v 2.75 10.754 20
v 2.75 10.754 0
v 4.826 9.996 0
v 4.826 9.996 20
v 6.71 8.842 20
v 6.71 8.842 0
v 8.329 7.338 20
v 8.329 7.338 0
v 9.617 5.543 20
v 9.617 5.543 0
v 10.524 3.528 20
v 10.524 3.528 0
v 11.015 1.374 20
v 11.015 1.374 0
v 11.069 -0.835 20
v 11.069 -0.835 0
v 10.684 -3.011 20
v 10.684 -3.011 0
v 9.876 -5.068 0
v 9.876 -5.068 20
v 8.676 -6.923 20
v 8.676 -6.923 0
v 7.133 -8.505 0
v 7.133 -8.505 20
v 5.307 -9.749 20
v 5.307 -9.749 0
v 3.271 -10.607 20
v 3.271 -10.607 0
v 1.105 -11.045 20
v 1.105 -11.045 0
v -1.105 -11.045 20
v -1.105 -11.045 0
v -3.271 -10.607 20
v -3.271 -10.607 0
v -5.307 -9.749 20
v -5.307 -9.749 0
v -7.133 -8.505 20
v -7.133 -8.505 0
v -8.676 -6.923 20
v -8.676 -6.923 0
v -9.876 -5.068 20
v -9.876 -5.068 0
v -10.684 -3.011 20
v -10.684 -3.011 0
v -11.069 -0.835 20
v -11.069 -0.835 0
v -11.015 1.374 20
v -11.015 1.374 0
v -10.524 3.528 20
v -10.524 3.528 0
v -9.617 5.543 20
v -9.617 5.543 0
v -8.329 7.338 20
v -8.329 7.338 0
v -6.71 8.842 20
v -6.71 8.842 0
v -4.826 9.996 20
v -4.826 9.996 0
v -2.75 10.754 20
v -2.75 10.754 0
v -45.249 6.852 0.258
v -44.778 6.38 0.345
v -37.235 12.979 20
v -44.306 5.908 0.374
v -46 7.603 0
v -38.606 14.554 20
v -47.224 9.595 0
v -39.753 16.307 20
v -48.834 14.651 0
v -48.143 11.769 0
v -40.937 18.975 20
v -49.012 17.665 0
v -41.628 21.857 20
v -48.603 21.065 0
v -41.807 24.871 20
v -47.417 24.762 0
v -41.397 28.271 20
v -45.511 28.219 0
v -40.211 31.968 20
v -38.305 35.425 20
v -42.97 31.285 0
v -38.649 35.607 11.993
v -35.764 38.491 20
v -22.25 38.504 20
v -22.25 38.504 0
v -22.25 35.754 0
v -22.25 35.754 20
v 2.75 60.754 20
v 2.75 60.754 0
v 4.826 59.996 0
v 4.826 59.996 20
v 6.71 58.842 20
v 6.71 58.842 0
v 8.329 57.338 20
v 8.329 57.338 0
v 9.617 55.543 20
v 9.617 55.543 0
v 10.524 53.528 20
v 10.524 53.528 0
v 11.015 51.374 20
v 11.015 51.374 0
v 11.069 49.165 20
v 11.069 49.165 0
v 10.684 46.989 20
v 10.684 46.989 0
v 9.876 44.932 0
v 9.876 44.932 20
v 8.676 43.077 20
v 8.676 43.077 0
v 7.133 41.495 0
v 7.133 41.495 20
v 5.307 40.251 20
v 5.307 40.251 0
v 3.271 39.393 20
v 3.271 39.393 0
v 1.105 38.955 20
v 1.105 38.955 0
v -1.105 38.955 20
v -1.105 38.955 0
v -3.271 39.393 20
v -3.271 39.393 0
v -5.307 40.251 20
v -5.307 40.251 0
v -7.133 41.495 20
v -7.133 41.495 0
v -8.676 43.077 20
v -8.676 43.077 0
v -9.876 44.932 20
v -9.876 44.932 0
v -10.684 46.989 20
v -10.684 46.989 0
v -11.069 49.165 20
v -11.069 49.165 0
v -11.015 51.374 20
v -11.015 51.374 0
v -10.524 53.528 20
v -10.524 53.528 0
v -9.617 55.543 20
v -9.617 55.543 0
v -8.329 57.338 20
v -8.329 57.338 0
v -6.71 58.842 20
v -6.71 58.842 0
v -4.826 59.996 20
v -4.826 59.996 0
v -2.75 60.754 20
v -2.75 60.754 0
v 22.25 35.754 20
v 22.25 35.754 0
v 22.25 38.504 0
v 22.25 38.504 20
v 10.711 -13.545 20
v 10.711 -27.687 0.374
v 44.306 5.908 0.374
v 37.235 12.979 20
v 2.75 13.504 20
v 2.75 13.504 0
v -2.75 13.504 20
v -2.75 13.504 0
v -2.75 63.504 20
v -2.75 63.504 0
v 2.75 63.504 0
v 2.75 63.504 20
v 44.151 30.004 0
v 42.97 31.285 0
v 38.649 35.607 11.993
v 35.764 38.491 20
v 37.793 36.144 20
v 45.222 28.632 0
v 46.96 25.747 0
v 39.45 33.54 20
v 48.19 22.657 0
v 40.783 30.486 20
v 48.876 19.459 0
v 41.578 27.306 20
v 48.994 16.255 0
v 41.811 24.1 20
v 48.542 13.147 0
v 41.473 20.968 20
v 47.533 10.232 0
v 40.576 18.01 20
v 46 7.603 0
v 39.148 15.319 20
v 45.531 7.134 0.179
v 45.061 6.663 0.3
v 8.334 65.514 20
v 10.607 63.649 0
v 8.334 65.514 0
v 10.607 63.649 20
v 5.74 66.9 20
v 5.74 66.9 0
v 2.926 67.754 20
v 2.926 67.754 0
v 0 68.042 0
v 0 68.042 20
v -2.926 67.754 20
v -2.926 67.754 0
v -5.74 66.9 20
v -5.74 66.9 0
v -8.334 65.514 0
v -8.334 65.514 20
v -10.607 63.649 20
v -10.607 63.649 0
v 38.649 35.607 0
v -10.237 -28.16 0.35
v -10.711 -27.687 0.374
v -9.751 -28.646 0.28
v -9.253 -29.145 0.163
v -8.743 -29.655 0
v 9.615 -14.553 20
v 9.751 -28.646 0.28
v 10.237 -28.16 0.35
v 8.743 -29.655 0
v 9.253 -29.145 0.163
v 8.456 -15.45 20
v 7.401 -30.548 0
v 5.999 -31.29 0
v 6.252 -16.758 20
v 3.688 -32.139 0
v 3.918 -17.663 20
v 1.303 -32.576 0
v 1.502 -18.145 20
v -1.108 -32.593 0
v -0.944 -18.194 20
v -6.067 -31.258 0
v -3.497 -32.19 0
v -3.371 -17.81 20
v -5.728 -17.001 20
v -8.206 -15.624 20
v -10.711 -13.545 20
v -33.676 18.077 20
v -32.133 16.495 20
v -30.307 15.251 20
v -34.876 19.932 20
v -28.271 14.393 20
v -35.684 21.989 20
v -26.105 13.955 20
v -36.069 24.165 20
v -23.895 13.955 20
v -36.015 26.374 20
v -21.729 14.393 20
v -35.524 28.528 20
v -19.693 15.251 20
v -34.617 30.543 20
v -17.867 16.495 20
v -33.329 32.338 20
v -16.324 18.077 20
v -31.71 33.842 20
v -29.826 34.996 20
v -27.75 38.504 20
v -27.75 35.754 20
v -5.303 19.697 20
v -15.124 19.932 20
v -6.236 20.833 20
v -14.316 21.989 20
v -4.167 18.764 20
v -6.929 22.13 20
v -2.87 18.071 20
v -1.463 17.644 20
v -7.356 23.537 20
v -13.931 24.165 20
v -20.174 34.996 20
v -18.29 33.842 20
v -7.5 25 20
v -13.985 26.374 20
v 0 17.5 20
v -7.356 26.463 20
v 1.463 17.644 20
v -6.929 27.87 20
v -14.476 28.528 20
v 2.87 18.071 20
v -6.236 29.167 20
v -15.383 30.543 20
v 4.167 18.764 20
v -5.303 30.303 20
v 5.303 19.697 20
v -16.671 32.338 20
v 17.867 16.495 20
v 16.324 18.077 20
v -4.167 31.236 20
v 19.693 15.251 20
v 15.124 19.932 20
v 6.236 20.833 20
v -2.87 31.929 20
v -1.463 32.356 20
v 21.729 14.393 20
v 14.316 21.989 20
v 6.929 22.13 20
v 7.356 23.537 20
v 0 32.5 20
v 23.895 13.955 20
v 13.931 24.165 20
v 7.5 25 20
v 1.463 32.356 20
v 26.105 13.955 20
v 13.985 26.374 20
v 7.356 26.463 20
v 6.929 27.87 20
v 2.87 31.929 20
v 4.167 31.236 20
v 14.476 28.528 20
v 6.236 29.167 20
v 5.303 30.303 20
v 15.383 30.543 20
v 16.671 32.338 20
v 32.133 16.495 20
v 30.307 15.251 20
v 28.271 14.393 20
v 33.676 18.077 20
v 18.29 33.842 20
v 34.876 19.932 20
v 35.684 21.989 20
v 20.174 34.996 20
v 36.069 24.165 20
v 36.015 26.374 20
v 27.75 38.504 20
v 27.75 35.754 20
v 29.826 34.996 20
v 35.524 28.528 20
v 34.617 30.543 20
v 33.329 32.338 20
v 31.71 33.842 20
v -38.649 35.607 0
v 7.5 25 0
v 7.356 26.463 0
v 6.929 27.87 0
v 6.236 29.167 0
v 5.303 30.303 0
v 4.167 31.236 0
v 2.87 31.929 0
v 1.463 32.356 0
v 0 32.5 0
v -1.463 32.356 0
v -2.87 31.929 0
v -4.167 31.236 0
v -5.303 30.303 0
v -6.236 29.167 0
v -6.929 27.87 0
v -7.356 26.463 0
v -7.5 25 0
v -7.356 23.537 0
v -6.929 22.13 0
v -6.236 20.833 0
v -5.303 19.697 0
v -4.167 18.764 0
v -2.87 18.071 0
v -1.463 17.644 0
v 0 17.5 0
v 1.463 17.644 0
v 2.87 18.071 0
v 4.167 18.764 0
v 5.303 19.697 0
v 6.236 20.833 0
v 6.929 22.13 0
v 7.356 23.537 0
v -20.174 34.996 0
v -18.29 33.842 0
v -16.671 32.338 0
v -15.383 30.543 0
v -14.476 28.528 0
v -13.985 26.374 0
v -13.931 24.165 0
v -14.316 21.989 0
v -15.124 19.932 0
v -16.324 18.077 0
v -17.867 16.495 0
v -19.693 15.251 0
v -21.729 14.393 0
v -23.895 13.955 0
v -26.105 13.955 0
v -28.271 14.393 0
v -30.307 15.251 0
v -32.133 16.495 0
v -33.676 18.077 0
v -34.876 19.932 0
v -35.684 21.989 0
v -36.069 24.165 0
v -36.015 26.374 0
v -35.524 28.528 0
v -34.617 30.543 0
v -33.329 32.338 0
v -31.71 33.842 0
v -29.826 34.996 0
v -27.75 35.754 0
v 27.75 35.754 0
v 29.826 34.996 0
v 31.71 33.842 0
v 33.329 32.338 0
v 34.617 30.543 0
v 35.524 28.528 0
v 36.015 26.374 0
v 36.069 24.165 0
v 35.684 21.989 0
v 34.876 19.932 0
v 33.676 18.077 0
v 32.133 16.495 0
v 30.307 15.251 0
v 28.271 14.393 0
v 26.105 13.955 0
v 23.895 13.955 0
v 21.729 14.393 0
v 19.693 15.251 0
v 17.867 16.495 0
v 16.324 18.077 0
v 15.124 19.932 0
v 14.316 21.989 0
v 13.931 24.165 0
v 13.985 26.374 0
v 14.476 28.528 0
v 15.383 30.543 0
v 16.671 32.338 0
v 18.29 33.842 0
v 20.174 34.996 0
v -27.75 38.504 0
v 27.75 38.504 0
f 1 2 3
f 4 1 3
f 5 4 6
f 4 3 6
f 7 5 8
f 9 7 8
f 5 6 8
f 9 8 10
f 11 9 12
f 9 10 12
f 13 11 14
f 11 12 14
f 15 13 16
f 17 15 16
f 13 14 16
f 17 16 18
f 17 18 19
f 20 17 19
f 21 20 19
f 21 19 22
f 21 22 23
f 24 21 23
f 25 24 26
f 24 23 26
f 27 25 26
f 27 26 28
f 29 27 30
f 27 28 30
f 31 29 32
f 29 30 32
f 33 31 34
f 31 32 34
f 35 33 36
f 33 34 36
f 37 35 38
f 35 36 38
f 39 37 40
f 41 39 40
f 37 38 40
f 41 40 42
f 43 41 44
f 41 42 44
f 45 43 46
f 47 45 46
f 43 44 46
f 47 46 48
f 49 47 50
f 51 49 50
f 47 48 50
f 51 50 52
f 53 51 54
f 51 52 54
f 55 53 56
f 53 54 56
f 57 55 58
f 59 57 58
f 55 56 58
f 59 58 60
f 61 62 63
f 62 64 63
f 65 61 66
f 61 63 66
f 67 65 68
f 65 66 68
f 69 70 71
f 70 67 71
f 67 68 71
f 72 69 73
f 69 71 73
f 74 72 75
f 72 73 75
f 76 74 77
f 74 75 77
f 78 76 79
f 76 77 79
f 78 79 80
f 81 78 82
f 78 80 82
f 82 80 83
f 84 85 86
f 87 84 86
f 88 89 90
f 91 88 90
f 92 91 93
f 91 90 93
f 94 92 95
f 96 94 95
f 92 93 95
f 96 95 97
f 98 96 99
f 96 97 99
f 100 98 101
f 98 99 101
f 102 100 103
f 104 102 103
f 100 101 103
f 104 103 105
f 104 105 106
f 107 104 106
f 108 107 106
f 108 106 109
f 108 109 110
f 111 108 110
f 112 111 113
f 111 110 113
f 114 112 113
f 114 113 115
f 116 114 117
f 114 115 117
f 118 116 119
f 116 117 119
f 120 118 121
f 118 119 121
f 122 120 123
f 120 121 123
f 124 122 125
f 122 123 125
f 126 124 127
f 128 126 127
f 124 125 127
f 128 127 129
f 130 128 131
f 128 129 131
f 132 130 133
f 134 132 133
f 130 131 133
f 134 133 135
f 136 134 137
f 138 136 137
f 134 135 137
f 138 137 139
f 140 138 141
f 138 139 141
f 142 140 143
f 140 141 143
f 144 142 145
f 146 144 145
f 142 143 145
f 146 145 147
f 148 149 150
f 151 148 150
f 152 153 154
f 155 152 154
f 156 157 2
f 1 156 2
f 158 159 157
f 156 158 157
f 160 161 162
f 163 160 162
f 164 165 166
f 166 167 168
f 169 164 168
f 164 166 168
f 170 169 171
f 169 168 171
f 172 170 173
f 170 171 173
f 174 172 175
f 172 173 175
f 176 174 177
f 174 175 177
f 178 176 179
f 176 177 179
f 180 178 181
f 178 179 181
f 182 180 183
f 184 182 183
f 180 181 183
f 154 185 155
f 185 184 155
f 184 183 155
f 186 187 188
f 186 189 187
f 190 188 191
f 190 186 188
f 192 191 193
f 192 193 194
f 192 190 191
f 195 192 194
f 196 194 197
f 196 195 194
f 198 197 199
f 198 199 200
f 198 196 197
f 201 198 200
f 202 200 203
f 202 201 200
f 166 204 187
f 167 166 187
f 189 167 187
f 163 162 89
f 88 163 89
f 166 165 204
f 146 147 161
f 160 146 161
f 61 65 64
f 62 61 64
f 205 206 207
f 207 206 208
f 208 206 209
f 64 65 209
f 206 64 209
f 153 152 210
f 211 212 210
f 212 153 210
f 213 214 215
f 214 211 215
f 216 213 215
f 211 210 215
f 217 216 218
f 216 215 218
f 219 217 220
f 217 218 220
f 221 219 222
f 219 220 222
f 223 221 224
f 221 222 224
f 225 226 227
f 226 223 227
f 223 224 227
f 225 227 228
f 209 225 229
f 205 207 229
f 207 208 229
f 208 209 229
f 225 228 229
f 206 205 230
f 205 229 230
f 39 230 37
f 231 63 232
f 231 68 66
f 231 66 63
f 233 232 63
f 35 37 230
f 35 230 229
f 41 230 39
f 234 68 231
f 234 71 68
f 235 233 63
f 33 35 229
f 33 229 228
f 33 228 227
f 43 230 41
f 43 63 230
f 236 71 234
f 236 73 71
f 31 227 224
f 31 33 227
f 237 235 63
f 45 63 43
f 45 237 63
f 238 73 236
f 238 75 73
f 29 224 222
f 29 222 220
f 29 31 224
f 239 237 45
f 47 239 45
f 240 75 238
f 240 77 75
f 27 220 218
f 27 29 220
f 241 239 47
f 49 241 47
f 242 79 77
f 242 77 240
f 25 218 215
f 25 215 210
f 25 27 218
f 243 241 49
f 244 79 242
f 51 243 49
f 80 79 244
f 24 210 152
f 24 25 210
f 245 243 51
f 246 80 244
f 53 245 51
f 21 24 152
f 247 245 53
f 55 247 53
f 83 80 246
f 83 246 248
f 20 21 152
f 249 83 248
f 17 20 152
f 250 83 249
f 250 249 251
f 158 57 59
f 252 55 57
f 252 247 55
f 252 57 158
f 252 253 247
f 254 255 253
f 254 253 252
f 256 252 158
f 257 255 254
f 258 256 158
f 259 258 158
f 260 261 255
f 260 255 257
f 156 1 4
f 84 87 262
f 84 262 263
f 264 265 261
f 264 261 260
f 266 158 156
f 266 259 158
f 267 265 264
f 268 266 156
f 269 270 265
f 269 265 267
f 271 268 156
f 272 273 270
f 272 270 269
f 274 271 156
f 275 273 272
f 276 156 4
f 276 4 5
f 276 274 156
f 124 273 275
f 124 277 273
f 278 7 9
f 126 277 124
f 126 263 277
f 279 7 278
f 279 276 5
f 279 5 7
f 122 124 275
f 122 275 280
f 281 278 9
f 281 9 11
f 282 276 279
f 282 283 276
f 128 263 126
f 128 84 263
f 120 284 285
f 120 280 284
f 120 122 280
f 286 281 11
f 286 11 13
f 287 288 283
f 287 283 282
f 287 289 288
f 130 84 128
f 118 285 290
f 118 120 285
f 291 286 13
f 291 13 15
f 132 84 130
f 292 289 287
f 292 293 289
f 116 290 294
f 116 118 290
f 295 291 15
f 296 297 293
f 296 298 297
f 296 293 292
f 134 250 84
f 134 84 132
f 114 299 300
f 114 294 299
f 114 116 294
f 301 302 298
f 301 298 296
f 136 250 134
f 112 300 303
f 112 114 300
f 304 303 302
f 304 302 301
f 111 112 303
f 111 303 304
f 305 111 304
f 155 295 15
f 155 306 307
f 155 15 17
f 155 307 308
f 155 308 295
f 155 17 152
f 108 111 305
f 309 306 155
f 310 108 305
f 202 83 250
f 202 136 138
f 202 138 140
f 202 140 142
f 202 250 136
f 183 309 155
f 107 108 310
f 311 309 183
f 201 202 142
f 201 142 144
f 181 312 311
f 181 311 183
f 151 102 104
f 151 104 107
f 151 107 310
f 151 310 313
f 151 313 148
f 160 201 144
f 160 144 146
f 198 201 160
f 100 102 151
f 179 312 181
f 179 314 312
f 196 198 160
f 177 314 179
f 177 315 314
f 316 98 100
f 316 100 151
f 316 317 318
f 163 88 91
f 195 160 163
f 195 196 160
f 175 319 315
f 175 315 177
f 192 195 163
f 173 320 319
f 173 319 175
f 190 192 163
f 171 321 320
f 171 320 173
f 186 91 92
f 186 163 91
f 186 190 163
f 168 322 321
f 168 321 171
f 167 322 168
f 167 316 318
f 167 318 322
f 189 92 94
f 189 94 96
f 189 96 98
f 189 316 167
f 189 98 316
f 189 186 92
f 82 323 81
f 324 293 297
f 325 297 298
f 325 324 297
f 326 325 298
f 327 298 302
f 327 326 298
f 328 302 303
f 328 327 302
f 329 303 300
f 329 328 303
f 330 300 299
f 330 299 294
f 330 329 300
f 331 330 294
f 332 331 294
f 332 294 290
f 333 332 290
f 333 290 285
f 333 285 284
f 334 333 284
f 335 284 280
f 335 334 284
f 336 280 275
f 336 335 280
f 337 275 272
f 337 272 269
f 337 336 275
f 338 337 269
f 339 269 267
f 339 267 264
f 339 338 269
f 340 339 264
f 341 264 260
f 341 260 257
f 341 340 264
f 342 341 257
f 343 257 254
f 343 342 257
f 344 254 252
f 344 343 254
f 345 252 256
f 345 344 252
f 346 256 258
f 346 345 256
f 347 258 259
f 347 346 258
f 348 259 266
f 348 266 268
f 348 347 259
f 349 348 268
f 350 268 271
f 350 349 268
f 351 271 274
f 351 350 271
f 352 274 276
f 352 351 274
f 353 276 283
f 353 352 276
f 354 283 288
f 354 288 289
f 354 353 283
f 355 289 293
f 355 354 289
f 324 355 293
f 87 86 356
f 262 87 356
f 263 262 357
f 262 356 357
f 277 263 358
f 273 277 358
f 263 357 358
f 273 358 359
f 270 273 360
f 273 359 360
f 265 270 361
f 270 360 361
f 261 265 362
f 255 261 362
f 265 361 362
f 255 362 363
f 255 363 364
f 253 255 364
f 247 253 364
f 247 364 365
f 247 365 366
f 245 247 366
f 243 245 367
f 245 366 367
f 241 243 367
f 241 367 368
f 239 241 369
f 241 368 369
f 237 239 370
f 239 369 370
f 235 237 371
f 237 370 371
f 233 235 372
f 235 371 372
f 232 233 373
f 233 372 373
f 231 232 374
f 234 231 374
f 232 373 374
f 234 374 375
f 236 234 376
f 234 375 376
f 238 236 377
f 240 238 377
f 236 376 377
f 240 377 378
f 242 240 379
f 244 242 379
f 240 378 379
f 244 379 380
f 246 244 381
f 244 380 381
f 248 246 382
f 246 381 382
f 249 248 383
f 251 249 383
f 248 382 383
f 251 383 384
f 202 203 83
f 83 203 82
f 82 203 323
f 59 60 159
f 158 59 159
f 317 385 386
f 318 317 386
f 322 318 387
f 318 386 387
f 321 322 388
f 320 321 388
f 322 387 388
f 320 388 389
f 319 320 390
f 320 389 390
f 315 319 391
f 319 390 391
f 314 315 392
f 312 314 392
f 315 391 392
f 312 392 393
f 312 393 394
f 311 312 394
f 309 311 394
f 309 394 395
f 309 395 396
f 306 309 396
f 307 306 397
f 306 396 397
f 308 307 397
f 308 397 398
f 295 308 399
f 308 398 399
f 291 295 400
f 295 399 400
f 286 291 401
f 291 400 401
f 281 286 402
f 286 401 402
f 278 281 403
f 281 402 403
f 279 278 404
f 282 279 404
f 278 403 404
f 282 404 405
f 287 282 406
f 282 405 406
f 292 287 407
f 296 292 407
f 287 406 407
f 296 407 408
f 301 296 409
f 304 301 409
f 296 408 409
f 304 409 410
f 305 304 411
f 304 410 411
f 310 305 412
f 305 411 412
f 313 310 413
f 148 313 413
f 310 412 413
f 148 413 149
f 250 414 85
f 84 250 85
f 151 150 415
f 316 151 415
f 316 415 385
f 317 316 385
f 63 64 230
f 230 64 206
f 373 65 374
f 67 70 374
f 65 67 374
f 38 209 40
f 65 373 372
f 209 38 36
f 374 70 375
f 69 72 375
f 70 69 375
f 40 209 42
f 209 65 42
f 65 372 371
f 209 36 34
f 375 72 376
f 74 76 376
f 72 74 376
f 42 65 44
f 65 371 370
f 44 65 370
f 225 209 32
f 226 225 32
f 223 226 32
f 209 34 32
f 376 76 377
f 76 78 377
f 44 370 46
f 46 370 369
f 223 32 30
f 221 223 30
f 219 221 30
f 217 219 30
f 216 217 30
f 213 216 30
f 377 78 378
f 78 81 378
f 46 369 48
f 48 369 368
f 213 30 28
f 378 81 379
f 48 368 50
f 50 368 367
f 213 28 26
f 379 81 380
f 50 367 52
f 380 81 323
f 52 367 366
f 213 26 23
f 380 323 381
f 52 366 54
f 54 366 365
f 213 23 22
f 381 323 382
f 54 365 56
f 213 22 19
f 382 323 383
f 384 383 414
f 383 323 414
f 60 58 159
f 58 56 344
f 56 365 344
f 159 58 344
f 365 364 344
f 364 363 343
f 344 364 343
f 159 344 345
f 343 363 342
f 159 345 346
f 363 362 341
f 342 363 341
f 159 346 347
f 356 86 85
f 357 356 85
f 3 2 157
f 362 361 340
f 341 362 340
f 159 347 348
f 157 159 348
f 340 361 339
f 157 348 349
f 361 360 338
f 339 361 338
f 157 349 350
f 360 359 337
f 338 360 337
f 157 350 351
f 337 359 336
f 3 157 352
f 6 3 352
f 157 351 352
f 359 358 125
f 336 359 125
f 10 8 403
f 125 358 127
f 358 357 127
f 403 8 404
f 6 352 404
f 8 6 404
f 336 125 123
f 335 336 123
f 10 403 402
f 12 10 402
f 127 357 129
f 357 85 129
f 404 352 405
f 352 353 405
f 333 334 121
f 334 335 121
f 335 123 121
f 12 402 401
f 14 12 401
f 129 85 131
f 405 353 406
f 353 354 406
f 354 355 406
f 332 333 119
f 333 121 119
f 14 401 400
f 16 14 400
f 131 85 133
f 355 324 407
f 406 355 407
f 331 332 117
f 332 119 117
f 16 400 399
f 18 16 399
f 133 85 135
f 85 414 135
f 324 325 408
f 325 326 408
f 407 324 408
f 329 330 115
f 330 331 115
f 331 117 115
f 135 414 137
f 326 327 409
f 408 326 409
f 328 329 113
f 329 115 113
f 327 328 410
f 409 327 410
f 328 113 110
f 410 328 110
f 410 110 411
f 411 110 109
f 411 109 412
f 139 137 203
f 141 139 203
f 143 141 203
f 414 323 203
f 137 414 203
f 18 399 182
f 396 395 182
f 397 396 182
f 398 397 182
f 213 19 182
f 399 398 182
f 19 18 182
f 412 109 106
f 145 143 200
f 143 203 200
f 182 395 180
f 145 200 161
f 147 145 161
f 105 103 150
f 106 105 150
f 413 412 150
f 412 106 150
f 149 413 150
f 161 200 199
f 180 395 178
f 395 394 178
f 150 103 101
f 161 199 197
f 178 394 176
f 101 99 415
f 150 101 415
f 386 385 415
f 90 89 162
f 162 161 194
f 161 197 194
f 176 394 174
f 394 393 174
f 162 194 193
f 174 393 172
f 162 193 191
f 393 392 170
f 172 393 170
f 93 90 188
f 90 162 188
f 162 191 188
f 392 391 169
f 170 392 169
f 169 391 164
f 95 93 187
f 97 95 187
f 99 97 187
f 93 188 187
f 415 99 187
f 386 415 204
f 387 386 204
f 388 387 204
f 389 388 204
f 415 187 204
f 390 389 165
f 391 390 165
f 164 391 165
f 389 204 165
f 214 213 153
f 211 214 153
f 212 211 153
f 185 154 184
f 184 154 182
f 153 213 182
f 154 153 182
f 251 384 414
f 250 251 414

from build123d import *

# Parameters (mm, degrees)
SKETCH1_R           = 7.5
BOSS_EXTRUDE1_DEPTH = 20
FILLET1_R           = 15
BOSS_EXTRUDE2_DEPTH = 20
CHAMFER1_SIZE       = 10
CHAMFER1_SIZE2      = 19.626105055
FILLET2_R           = 17


with BuildPart() as part:
    # Sketch1 → Boss-Extrude1 (new body)
    with BuildSketch(Plane.XY):
        Polygon((0, -24.255339059), (49.255339059, 25), (0, 74.255339059), (-49.255339059, 25), align=None)
        with Locations((0, 25)):
            Circle(SKETCH1_R, mode=Mode.SUBTRACT)
        with BuildLine():
            Line((-2.75, 13.503952762), (2.75, 13.503952762))
            Line((2.75, 13.503952762), (2.75, 10.753952762))
            ThreePointArc((2.75, 10.753952762), (0, -11.1), (-2.75, 10.753952762))
            Line((-2.75, 10.753952762), (-2.75, 13.503952762))
        make_face(mode=Mode.SUBTRACT)
        with BuildLine():
            Line((-2.75, 63.503952762), (2.75, 63.503952762))
            Line((2.75, 63.503952762), (2.75, 60.753952762))
            ThreePointArc((2.75, 60.753952762), (0, 38.9), (-2.75, 60.753952762))
            Line((-2.75, 60.753952762), (-2.75, 63.503952762))
        make_face(mode=Mode.SUBTRACT)
        with BuildLine():
            Line((22.25, 38.503952762), (27.75, 38.503952762))
            Line((27.75, 38.503952762), (27.75, 35.753952762))
            ThreePointArc((27.75, 35.753952762), (25, 13.9), (22.25, 35.753952762))
            Line((22.25, 35.753952762), (22.25, 38.503952762))
        make_face(mode=Mode.SUBTRACT)
        with BuildLine():
            Line((-27.75, 38.503952762), (-22.25, 38.503952762))
            Line((-22.25, 38.503952762), (-22.25, 35.753952762))
            ThreePointArc((-22.25, 35.753952762), (-25, 13.9), (-27.75, 35.753952762))
            Line((-27.75, 35.753952762), (-27.75, 38.503952762))
        make_face(mode=Mode.SUBTRACT)
    extrude(amount=BOSS_EXTRUDE1_DEPTH)

    # Fillet1
    fillet1_edges = [part.edges().sort_by_distance(p)[0] for p in [
        (49.255339059, 25, 10),
        (0, -24.255339059, 10),
        (-49.255339059, 25, 10),
        (0, 74.255339059, 10),
    ]]
    fillet(fillet1_edges, radius=FILLET1_R)

    # Sketch5 → Boss-Extrude2 (add)
    with BuildSketch(Plane(origin=(0, 0, 0), x_dir=(-1, 0, 0), z_dir=(0, 0, -1))):
        Polygon((38.648737342, 35.606601718), (56.326406871, 17.928932188), (0, -38.397474683), (-56.326406871, 17.928932188), (-38.648737342, 35.606601718), (-38.648737342, 14.393398282), (-10.606601718, -13.648737342), (10.606601718, -13.648737342), (38.648737342, 14.393398282), align=None)
    extrude(amount=-BOSS_EXTRUDE2_DEPTH)

    # Chamfer1
    chamfer1_edges = [part.edges().sort_by_distance(p)[0] for p in [
        (-28.163203436, -10.234271247, 20),
        (28.163203436, -10.234271247, 20),
    ]]
    chamfer1_side = [part.faces().sort_by_distance(p)[0] for p in [
        (0, 14.439859593, 20),
    ]]
    chamfer(chamfer1_edges, length=CHAMFER1_SIZE, length2=CHAMFER1_SIZE2, reference=chamfer1_side[0])

    # Fillet2
    # the kernel refuses this fillet: 17 mm, written as the material it takes off along each edge
    with BuildSketch(Plane(origin=(0, -4.097424311, 47.974654117), x_dir=(-0.776565314012209, 0.5111563778483158, -0.3683279387422424), z_dir=(-2.7797289092988672e-15, -0.5846134144132094, -0.8113119965143676))) as fillet2_piece_1:
        with BuildLine():
            CenterArc((FILLET2_R * 0.811311996514, FILLET2_R), FILLET2_R, 191.89433134, 78.10566866)
            Line((-FILLET2_R * 0.167217384978, FILLET2_R * 0.793892626146), (0, 0))
            Line((0, 0), (FILLET2_R * 0.811311996514, 0))
        make_face()
    extrude(amount=93.152096374, mode=Mode.SUBTRACT)
    with BuildSketch(Plane(origin=(35.611999219, 38.643339841, 57.867777278), x_dir=(-0.7071067811865526, -0.7071067811865426, -3.622643282177079e-15), z_dir=(0.3210197609601017, -0.3210197609601017, -0.8910065241883689)), Plane(origin=(-35.611999219, 38.643339841, 57.867777278), x_dir=(0.630036755335051, 0.6300367553350514, -0.45399049973954475), z_dir=(-0.3210197609601016, -0.3210197609601017, -0.8910065241883689))) as fillet2_piece_2:
        with BuildLine():
            CenterArc((FILLET2_R, FILLET2_R), FILLET2_R, 180, 90)
            Line((0, FILLET2_R), (0, 0))
            Line((0, 0), (FILLET2_R, 0))
        make_face()
    extrude(amount=107.026892646, mode=Mode.SUBTRACT)


solid = part.part
